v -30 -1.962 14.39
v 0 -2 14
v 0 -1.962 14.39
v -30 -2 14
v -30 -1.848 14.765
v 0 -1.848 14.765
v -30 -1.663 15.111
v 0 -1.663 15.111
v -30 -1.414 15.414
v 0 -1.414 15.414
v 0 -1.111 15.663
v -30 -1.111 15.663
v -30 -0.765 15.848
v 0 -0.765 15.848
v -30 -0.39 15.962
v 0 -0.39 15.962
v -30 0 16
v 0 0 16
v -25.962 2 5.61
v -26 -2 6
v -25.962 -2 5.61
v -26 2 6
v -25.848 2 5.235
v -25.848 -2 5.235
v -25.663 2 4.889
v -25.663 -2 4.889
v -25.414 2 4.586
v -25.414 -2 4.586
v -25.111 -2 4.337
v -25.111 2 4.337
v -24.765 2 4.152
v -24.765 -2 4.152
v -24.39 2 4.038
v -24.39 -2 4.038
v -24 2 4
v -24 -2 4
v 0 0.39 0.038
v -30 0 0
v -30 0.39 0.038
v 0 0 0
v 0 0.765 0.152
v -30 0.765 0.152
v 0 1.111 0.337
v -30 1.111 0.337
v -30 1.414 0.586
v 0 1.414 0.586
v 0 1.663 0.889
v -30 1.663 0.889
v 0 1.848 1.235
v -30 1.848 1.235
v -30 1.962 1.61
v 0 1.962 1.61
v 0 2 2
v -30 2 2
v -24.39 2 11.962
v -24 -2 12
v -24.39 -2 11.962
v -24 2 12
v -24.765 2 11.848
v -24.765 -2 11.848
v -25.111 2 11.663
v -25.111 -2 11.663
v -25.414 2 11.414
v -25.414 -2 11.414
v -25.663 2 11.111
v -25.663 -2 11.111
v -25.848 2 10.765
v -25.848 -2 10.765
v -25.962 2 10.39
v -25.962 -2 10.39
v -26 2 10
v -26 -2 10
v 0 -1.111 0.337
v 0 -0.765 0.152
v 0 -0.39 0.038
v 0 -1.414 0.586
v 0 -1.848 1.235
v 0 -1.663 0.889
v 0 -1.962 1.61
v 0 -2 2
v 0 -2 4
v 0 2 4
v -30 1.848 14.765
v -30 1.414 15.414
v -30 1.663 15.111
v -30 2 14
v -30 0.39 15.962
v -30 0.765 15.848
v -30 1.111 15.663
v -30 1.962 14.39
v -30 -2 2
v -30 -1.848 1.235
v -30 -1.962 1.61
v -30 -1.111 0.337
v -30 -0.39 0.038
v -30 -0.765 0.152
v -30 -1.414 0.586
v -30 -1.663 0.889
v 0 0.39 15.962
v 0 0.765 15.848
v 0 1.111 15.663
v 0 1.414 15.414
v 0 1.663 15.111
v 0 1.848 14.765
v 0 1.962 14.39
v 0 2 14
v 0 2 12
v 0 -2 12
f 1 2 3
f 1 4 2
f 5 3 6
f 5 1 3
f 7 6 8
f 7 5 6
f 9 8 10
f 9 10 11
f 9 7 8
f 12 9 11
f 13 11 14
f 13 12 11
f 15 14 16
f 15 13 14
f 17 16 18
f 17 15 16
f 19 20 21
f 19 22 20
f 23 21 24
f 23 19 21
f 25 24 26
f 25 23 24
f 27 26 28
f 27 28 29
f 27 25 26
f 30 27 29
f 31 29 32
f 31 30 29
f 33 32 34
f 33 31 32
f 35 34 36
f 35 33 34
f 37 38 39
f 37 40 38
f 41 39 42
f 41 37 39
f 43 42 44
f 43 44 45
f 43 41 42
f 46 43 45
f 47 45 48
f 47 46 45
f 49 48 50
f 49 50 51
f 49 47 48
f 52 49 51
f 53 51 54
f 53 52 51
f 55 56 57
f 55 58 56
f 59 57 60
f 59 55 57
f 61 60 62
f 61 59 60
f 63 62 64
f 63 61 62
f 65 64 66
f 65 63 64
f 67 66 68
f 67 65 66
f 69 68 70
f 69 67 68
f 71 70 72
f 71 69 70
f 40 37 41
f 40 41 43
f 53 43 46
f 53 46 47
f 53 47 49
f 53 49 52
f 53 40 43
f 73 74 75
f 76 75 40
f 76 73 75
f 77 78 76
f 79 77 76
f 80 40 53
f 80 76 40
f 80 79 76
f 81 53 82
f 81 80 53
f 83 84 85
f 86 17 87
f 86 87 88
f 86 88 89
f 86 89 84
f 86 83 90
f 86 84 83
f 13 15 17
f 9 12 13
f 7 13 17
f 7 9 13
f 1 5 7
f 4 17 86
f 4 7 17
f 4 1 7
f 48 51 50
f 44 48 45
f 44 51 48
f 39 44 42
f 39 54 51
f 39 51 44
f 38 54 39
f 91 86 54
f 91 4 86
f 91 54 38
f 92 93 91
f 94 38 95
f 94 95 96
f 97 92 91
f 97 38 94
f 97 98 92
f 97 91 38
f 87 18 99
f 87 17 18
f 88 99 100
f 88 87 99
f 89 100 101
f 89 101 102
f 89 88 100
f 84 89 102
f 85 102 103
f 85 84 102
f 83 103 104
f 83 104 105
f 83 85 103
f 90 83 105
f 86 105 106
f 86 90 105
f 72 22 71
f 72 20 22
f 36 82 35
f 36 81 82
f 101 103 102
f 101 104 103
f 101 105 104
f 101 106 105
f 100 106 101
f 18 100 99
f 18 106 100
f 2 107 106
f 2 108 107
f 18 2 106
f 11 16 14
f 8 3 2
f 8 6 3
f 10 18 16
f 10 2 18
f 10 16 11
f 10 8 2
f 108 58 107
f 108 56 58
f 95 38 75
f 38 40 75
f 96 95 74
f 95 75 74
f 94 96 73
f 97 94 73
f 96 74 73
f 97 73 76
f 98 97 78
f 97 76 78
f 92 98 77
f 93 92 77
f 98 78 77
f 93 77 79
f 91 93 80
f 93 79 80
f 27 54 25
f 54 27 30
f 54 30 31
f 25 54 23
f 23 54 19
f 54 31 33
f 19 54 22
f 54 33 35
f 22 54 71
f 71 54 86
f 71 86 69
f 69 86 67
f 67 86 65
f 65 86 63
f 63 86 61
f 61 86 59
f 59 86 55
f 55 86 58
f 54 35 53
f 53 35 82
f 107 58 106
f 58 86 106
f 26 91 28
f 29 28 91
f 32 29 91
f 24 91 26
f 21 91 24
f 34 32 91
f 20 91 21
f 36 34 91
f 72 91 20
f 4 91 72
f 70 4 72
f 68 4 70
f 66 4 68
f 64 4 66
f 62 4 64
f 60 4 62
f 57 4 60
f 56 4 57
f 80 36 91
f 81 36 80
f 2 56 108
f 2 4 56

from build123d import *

# Parameters (mm, degrees)
F1_DEPTH = 2
F2_R     = 1.99999


# Not quite as in the source:
# - a fillet or chamfer is up to 0.001 mm smaller than in the source, because OpenCascade refuses the exact size


with BuildPart() as f1:
    # F0 (on Front) → F1 (new body, symmetric)
    with BuildSketch(Plane.XZ):
        Polygon((0, 12), (0, 16), (-30, 16), (-30, 0), (0, 0), (0, 4), (-26, 4), (-26, 12), align=None)
    extrude(amount=F1_DEPTH, both=True)

    # F2 (radius 2 in the source; OpenCascade refuses exactly that, so slightly less here)
    f2_edges = [f1.edges().sort_by_distance(p)[0] for p in [
        (-15, -2, 16),
        (-15, 2, 16),
        (-15, -2, 0),
        (-15, 2, 0),
        (-26, 0, 4),
        (-26, 0, 12),
    ]]
    fillet(f2_edges, radius=F2_R)


solid = f1.part
